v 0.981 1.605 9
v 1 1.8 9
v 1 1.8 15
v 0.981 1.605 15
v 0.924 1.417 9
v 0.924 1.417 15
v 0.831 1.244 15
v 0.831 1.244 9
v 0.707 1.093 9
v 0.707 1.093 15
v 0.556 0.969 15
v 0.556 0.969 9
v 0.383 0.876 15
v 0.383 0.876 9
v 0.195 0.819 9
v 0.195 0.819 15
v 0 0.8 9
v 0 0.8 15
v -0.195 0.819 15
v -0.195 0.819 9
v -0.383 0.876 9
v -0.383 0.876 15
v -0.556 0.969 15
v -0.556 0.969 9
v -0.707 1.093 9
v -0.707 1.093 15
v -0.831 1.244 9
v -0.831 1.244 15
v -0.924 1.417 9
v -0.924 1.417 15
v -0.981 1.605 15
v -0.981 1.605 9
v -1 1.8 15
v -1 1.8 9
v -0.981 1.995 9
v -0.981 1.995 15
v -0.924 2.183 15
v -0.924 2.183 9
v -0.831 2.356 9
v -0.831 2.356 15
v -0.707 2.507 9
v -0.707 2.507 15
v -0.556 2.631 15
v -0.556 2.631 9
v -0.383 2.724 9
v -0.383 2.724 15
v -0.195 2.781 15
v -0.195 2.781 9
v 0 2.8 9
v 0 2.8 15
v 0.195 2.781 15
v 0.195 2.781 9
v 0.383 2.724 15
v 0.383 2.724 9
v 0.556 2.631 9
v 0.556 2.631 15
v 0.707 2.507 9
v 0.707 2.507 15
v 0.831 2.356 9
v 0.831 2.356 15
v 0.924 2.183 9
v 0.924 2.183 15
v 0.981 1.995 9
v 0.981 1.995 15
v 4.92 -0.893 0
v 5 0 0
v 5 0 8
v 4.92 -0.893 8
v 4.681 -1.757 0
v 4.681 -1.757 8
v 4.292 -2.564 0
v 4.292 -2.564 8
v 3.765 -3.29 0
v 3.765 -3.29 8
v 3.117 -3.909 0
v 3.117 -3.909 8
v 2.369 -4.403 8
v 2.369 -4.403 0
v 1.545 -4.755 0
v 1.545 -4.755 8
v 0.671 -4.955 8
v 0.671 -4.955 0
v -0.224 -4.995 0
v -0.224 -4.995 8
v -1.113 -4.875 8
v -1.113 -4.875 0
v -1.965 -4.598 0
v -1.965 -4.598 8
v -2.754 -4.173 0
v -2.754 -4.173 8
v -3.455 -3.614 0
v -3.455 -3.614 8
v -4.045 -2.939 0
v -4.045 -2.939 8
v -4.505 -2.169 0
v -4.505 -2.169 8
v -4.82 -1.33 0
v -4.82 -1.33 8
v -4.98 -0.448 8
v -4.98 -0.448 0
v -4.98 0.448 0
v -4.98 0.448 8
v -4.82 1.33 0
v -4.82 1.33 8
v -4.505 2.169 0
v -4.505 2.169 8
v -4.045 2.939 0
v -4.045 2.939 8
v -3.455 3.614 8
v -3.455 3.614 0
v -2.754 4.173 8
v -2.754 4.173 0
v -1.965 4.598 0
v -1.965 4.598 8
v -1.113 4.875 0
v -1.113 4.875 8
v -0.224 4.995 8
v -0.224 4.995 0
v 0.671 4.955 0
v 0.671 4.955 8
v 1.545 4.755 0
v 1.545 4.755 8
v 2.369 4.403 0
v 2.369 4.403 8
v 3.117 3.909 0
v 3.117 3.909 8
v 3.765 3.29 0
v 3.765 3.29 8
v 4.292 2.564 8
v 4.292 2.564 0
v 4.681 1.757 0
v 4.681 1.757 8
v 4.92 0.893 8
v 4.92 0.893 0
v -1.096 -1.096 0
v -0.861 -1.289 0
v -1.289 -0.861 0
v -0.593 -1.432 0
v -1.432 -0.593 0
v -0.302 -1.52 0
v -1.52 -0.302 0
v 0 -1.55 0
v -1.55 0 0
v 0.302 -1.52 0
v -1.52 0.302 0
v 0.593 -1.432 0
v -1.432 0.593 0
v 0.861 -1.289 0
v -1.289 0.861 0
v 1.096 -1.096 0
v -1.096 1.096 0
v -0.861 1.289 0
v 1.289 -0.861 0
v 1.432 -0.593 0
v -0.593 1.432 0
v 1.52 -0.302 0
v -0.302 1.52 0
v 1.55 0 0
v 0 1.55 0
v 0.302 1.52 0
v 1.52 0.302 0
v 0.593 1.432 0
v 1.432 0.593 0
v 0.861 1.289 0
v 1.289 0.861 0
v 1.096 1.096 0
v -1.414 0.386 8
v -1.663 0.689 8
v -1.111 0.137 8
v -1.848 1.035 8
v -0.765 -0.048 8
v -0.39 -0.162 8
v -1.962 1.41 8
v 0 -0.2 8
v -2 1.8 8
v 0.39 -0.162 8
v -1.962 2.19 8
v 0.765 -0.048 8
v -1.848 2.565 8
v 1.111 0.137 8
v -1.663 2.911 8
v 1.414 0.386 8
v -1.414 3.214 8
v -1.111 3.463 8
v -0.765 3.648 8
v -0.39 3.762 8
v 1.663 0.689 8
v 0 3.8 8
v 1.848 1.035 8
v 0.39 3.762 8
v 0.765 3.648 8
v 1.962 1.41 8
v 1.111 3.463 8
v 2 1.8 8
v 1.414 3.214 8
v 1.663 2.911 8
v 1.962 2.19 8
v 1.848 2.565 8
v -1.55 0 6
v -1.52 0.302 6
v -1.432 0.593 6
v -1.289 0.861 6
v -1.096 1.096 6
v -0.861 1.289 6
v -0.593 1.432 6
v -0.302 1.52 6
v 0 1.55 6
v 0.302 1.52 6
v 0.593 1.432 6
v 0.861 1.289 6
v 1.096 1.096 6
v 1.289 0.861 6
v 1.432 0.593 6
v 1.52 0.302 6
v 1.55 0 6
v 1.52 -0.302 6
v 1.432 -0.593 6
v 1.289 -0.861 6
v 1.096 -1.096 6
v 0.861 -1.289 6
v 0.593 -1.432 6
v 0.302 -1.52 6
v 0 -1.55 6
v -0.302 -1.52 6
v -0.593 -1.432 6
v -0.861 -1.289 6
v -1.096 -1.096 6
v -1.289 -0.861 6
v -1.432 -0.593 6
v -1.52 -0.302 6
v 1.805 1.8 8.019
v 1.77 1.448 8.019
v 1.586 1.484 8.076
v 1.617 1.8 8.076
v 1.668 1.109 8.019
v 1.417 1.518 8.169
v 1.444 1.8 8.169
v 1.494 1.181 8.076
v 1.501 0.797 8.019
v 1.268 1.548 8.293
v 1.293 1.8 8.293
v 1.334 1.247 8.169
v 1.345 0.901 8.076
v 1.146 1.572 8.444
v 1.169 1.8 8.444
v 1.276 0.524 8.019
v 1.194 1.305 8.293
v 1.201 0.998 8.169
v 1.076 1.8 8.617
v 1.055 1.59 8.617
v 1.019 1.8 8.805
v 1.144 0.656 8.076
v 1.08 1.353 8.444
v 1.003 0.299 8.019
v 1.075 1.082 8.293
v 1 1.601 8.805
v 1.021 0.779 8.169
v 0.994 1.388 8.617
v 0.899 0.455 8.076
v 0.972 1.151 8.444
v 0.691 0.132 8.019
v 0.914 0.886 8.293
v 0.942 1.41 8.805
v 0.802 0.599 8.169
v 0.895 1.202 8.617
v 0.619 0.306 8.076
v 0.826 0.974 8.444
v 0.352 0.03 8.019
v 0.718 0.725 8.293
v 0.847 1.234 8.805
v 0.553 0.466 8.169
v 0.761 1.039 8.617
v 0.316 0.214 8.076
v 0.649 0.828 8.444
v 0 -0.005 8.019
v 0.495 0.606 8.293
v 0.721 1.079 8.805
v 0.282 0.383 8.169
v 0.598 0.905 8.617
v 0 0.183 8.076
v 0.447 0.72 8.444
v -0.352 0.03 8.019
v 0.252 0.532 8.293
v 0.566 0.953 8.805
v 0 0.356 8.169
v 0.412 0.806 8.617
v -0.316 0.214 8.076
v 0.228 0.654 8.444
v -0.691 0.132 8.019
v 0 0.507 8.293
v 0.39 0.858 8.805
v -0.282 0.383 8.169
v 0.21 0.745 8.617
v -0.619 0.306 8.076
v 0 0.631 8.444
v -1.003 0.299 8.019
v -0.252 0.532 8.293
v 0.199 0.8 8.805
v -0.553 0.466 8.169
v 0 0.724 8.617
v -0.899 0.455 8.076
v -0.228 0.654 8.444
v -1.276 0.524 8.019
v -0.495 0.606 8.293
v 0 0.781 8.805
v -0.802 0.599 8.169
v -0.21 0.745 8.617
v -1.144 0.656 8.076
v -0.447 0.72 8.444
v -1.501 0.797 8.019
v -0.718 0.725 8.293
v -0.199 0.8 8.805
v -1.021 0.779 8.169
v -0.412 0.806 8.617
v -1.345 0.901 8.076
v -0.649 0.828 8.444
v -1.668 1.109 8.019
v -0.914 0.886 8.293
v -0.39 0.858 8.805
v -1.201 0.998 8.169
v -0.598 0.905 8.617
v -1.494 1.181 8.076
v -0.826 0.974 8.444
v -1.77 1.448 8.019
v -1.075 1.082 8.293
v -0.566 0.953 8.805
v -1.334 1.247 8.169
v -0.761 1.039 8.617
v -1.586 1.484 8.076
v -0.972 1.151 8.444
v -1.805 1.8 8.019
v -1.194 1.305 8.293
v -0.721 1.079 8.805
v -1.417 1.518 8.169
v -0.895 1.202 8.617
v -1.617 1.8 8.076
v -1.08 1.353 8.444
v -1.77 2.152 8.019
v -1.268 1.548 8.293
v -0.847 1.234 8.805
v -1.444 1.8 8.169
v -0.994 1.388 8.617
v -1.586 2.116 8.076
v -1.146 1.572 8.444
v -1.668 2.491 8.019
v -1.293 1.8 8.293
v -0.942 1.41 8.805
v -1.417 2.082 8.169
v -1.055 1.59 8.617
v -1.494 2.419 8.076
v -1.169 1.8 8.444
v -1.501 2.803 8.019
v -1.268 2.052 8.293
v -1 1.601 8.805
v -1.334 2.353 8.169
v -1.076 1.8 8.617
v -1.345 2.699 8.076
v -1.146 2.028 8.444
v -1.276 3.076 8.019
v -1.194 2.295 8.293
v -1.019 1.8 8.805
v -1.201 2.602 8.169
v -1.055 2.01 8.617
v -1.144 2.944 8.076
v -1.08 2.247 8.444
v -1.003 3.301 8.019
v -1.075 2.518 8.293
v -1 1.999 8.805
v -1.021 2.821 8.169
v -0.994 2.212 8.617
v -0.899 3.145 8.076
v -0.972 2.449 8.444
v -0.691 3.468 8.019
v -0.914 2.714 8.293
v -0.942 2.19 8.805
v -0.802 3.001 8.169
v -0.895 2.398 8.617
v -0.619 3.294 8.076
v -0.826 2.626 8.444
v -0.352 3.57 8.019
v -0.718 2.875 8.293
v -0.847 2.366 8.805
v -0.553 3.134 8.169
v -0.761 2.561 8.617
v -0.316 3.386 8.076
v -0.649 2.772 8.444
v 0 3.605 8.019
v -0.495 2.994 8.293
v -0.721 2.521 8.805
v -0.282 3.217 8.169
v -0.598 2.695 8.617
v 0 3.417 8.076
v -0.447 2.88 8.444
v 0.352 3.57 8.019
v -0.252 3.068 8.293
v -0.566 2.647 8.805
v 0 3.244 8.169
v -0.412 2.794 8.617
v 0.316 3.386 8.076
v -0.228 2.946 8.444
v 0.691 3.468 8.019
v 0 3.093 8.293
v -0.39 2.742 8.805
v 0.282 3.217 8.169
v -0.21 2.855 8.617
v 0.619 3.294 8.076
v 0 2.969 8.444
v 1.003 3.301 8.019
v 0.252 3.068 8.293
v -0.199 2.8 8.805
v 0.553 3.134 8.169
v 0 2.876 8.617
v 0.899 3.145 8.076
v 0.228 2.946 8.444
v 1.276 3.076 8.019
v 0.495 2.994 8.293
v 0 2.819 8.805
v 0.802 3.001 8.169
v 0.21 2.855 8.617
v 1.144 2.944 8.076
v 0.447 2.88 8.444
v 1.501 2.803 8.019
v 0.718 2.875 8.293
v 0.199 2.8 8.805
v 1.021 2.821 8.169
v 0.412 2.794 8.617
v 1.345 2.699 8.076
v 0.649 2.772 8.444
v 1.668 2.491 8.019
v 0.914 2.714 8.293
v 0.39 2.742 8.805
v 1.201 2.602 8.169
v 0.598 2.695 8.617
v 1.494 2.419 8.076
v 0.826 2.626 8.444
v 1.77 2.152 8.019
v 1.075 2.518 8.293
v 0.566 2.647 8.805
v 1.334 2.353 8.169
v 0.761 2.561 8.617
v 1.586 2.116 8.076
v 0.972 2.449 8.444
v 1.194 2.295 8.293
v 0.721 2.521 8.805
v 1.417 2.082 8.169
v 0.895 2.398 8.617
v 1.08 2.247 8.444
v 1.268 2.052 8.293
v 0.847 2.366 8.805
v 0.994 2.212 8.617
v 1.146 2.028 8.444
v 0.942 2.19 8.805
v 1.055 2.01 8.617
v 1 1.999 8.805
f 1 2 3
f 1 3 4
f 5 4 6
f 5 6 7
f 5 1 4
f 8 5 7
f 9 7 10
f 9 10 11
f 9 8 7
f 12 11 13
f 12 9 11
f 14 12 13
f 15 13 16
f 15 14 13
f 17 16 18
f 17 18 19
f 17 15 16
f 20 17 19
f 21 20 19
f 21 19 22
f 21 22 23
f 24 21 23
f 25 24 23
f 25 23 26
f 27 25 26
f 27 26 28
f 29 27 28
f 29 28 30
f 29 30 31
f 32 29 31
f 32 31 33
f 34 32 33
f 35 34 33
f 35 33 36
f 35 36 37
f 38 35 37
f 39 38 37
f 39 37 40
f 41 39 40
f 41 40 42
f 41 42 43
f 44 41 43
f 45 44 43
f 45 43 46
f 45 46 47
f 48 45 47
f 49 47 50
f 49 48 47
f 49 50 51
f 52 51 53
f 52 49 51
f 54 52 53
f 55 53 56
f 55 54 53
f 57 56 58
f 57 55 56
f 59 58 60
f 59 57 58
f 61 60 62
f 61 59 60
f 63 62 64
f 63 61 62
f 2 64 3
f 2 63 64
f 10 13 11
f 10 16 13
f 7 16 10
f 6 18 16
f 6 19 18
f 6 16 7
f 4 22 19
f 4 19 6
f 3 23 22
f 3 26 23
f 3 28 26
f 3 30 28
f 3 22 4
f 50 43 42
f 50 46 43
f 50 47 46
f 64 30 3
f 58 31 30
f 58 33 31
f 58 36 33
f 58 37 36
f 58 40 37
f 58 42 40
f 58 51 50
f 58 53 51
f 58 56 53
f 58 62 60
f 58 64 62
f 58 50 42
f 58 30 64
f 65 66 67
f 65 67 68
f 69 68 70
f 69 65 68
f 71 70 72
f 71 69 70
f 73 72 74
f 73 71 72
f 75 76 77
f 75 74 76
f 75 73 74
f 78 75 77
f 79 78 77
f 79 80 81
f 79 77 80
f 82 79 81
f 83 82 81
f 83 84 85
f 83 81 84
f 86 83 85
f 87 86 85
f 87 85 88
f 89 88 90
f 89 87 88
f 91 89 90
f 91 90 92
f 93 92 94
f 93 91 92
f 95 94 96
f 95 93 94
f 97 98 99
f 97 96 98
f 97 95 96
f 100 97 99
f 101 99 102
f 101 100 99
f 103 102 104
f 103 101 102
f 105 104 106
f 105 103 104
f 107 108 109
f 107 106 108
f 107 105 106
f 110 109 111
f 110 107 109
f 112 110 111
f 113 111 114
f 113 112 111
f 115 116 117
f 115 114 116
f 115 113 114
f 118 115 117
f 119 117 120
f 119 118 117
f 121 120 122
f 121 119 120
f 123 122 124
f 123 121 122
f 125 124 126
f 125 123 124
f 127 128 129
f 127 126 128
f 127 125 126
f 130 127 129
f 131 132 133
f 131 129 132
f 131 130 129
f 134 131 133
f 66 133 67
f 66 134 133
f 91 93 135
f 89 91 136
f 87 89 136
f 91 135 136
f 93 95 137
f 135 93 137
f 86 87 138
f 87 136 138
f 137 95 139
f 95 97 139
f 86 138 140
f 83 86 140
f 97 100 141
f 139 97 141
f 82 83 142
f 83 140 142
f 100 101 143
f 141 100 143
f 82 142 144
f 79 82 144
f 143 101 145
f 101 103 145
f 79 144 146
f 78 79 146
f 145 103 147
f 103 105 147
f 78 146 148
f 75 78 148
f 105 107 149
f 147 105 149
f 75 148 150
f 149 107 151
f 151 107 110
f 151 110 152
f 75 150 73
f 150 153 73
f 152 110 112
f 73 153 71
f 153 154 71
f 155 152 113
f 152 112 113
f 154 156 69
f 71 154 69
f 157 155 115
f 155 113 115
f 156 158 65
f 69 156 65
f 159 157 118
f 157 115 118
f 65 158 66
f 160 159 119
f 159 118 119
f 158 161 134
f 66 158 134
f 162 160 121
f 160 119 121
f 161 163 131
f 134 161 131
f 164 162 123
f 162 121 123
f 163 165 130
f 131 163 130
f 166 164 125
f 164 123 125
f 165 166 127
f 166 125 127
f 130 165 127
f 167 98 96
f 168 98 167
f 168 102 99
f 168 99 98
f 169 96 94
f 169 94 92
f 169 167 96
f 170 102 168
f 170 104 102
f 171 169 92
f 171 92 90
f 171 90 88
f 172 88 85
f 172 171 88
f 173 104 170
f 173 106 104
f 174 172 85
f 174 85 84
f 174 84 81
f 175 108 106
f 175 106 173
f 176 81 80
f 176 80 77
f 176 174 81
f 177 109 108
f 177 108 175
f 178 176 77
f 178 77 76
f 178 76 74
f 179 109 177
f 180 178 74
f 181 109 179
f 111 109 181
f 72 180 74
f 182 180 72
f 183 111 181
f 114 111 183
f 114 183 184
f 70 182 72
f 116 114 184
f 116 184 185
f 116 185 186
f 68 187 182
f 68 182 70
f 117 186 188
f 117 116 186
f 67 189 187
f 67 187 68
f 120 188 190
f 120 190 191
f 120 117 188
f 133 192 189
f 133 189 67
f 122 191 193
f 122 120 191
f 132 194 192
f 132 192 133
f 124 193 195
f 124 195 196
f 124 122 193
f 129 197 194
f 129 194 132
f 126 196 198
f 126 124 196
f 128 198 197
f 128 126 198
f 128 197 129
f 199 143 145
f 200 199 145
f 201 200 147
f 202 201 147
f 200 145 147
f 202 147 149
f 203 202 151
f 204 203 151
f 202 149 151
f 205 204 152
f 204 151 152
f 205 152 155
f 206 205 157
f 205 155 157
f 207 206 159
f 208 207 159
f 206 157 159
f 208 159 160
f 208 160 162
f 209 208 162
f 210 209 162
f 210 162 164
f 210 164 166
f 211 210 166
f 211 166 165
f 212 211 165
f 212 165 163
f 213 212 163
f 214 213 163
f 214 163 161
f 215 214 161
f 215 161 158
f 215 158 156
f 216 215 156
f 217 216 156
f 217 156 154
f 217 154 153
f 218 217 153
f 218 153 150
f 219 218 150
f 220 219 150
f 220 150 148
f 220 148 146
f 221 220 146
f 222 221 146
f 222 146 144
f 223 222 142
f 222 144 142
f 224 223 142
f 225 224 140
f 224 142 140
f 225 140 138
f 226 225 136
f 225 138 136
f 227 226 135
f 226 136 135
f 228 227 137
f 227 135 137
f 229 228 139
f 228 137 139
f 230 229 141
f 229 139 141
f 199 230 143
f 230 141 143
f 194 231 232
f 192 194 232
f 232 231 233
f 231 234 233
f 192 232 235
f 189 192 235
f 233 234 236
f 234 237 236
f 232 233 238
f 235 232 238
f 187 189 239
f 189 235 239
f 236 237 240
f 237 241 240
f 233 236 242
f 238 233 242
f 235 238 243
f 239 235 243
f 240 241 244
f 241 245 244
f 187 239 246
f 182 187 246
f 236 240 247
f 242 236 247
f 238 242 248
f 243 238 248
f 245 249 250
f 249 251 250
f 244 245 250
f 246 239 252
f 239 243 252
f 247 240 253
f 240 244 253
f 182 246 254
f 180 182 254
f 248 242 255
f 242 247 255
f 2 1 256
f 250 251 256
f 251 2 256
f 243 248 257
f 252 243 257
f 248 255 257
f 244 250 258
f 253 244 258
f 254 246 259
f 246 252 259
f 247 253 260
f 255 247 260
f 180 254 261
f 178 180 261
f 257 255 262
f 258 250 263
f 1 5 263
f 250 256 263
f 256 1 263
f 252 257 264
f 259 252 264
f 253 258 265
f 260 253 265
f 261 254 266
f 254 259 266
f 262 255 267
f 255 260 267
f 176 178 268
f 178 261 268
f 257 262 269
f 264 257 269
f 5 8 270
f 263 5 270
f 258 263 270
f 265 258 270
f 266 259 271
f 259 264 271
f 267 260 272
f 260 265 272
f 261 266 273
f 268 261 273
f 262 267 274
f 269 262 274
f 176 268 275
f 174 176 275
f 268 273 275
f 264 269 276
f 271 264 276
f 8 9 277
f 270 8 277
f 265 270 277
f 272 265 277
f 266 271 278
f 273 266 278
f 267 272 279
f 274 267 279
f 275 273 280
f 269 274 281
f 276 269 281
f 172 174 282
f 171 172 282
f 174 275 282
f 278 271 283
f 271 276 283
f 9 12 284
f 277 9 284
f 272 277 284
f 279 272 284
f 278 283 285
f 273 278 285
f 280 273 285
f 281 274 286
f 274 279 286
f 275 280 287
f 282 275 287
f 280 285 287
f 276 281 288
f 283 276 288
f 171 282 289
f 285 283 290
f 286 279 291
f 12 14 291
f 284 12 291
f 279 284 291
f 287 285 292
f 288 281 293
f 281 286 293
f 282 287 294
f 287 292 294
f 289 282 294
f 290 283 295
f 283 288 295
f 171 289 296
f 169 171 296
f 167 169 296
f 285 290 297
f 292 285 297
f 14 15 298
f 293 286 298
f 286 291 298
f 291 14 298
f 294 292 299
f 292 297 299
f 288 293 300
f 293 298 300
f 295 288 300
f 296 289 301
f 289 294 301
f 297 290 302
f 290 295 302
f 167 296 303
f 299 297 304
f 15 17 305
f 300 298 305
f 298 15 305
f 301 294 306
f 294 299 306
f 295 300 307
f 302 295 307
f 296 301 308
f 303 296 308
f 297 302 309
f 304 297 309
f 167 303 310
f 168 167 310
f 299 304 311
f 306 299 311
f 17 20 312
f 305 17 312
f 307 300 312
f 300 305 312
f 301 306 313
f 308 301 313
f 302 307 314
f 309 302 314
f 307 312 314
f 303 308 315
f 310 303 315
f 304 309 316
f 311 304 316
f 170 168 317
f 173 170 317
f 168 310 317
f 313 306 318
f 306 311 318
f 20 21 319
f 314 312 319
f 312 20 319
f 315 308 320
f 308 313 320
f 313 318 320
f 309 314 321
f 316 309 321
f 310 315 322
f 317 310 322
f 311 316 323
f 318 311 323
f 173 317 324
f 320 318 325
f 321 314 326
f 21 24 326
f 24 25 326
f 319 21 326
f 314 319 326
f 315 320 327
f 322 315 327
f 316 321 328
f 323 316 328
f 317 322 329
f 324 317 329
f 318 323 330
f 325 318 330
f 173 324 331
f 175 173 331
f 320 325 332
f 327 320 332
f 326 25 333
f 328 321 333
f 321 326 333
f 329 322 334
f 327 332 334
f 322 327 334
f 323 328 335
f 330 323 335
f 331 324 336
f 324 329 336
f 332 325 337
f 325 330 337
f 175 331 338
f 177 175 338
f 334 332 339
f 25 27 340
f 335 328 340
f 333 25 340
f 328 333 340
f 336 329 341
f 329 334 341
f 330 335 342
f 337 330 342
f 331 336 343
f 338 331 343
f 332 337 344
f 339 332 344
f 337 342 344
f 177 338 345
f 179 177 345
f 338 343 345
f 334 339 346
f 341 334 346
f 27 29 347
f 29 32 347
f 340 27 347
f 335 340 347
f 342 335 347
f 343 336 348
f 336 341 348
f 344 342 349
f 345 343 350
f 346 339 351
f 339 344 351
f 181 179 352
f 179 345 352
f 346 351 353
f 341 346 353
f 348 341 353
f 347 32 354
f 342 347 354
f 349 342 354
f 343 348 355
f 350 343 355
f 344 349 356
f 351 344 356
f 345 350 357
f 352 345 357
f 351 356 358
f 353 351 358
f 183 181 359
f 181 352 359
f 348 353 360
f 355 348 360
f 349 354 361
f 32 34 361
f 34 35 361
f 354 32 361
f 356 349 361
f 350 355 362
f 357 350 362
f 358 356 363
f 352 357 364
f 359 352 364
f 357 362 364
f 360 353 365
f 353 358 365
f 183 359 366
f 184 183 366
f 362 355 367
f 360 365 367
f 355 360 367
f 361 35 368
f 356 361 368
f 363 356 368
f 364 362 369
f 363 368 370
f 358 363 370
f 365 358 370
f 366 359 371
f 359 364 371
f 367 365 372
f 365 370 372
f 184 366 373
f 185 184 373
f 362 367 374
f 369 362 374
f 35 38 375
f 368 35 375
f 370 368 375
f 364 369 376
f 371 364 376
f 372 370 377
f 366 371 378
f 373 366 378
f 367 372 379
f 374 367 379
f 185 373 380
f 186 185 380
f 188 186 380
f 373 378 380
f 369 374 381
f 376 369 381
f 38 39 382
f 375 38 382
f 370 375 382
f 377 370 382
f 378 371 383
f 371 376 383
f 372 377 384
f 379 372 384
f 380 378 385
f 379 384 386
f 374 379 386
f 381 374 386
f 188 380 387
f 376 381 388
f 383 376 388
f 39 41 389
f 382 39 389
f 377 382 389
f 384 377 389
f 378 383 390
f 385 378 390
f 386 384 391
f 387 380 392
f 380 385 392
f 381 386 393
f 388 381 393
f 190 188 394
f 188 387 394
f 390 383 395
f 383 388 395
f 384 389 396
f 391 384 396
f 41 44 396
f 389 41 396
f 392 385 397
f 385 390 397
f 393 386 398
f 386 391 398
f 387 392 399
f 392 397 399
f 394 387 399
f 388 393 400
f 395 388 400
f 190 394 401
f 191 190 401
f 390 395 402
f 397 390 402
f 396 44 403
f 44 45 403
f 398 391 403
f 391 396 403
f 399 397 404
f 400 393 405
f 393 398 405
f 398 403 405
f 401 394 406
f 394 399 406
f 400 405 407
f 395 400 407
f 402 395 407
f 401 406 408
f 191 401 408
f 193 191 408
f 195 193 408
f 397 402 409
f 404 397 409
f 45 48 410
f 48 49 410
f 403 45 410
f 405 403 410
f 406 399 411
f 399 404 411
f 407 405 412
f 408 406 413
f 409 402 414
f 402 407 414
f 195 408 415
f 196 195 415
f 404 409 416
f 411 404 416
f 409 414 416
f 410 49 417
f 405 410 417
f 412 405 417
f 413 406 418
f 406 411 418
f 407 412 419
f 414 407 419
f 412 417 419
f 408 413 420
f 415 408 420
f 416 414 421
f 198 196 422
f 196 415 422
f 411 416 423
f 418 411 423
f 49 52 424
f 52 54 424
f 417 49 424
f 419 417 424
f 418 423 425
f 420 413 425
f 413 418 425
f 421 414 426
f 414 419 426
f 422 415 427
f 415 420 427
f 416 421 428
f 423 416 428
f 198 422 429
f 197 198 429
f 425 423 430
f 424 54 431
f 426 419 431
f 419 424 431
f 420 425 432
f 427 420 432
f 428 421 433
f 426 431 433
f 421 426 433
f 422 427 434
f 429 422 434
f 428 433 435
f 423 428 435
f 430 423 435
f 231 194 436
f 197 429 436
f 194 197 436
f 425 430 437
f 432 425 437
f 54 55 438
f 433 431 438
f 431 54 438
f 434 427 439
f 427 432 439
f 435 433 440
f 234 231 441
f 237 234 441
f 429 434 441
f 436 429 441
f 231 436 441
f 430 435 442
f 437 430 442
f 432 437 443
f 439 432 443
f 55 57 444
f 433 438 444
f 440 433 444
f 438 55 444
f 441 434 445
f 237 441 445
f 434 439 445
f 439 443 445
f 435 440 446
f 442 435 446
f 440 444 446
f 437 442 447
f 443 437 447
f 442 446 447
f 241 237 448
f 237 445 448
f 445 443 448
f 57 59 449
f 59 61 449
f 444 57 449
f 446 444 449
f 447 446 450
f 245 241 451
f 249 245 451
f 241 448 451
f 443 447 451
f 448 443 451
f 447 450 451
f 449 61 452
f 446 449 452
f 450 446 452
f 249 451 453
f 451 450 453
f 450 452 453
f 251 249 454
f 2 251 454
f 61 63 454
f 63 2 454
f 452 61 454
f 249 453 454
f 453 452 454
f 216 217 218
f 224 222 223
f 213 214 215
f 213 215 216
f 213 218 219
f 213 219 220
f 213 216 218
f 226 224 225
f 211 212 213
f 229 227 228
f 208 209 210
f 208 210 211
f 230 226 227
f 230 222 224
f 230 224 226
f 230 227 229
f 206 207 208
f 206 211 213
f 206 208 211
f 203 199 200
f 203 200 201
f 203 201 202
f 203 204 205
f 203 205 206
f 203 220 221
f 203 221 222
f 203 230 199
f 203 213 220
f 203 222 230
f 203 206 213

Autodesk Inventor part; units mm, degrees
ref_plane "YZ Plane" through (0, 0, 0) normal (1, 0, 0) x (0, 1, 0)
ref_plane "XZ Plane" through (0, 0, 0) normal (0, 1, 0) x (-1, 0, 0)
ref_plane "XY Plane" through (0, 0, 0) normal (0, 0, 1) x (1, 0, 0)
sketch "Эскиз1" plane through (0, 0, 0) normal (0, 0, 1) x (1, 0, 0)
  circle A0 centre (0, 0) radius 5
  dimension "d0" = 10
extrude "Выдавливание1" add sketch "Эскиз1" along normal blind 8
sketch "Эскиз2" plane through (0, 0, 8) normal (0, 0, 1) x (1, 0, 0)
  line L0 (0, 0) -> (0, 1.8)
  circle A0 centre (0, 1.8) radius 1
  dimension "d3" = 1.8
  dimension "d4" = 2
extrude "Выдавливание2" add sketch "Эскиз2" along normal blind 7
sketch "Sketch3" plane through (0, 0, 0) normal (0, 0, -1) x (-1, 0, 0)
  circle A0 centre (0, 0) radius 1.55
  dimension "d7" = 3.1
extrude "Extrusion3" cut sketch "Sketch3" against normal blind 6
fillet "Fillet1" radius 1 1 edges at (-1, 1.8, 8)
properties part number "excentrick_2" material "Stainless Steel"
